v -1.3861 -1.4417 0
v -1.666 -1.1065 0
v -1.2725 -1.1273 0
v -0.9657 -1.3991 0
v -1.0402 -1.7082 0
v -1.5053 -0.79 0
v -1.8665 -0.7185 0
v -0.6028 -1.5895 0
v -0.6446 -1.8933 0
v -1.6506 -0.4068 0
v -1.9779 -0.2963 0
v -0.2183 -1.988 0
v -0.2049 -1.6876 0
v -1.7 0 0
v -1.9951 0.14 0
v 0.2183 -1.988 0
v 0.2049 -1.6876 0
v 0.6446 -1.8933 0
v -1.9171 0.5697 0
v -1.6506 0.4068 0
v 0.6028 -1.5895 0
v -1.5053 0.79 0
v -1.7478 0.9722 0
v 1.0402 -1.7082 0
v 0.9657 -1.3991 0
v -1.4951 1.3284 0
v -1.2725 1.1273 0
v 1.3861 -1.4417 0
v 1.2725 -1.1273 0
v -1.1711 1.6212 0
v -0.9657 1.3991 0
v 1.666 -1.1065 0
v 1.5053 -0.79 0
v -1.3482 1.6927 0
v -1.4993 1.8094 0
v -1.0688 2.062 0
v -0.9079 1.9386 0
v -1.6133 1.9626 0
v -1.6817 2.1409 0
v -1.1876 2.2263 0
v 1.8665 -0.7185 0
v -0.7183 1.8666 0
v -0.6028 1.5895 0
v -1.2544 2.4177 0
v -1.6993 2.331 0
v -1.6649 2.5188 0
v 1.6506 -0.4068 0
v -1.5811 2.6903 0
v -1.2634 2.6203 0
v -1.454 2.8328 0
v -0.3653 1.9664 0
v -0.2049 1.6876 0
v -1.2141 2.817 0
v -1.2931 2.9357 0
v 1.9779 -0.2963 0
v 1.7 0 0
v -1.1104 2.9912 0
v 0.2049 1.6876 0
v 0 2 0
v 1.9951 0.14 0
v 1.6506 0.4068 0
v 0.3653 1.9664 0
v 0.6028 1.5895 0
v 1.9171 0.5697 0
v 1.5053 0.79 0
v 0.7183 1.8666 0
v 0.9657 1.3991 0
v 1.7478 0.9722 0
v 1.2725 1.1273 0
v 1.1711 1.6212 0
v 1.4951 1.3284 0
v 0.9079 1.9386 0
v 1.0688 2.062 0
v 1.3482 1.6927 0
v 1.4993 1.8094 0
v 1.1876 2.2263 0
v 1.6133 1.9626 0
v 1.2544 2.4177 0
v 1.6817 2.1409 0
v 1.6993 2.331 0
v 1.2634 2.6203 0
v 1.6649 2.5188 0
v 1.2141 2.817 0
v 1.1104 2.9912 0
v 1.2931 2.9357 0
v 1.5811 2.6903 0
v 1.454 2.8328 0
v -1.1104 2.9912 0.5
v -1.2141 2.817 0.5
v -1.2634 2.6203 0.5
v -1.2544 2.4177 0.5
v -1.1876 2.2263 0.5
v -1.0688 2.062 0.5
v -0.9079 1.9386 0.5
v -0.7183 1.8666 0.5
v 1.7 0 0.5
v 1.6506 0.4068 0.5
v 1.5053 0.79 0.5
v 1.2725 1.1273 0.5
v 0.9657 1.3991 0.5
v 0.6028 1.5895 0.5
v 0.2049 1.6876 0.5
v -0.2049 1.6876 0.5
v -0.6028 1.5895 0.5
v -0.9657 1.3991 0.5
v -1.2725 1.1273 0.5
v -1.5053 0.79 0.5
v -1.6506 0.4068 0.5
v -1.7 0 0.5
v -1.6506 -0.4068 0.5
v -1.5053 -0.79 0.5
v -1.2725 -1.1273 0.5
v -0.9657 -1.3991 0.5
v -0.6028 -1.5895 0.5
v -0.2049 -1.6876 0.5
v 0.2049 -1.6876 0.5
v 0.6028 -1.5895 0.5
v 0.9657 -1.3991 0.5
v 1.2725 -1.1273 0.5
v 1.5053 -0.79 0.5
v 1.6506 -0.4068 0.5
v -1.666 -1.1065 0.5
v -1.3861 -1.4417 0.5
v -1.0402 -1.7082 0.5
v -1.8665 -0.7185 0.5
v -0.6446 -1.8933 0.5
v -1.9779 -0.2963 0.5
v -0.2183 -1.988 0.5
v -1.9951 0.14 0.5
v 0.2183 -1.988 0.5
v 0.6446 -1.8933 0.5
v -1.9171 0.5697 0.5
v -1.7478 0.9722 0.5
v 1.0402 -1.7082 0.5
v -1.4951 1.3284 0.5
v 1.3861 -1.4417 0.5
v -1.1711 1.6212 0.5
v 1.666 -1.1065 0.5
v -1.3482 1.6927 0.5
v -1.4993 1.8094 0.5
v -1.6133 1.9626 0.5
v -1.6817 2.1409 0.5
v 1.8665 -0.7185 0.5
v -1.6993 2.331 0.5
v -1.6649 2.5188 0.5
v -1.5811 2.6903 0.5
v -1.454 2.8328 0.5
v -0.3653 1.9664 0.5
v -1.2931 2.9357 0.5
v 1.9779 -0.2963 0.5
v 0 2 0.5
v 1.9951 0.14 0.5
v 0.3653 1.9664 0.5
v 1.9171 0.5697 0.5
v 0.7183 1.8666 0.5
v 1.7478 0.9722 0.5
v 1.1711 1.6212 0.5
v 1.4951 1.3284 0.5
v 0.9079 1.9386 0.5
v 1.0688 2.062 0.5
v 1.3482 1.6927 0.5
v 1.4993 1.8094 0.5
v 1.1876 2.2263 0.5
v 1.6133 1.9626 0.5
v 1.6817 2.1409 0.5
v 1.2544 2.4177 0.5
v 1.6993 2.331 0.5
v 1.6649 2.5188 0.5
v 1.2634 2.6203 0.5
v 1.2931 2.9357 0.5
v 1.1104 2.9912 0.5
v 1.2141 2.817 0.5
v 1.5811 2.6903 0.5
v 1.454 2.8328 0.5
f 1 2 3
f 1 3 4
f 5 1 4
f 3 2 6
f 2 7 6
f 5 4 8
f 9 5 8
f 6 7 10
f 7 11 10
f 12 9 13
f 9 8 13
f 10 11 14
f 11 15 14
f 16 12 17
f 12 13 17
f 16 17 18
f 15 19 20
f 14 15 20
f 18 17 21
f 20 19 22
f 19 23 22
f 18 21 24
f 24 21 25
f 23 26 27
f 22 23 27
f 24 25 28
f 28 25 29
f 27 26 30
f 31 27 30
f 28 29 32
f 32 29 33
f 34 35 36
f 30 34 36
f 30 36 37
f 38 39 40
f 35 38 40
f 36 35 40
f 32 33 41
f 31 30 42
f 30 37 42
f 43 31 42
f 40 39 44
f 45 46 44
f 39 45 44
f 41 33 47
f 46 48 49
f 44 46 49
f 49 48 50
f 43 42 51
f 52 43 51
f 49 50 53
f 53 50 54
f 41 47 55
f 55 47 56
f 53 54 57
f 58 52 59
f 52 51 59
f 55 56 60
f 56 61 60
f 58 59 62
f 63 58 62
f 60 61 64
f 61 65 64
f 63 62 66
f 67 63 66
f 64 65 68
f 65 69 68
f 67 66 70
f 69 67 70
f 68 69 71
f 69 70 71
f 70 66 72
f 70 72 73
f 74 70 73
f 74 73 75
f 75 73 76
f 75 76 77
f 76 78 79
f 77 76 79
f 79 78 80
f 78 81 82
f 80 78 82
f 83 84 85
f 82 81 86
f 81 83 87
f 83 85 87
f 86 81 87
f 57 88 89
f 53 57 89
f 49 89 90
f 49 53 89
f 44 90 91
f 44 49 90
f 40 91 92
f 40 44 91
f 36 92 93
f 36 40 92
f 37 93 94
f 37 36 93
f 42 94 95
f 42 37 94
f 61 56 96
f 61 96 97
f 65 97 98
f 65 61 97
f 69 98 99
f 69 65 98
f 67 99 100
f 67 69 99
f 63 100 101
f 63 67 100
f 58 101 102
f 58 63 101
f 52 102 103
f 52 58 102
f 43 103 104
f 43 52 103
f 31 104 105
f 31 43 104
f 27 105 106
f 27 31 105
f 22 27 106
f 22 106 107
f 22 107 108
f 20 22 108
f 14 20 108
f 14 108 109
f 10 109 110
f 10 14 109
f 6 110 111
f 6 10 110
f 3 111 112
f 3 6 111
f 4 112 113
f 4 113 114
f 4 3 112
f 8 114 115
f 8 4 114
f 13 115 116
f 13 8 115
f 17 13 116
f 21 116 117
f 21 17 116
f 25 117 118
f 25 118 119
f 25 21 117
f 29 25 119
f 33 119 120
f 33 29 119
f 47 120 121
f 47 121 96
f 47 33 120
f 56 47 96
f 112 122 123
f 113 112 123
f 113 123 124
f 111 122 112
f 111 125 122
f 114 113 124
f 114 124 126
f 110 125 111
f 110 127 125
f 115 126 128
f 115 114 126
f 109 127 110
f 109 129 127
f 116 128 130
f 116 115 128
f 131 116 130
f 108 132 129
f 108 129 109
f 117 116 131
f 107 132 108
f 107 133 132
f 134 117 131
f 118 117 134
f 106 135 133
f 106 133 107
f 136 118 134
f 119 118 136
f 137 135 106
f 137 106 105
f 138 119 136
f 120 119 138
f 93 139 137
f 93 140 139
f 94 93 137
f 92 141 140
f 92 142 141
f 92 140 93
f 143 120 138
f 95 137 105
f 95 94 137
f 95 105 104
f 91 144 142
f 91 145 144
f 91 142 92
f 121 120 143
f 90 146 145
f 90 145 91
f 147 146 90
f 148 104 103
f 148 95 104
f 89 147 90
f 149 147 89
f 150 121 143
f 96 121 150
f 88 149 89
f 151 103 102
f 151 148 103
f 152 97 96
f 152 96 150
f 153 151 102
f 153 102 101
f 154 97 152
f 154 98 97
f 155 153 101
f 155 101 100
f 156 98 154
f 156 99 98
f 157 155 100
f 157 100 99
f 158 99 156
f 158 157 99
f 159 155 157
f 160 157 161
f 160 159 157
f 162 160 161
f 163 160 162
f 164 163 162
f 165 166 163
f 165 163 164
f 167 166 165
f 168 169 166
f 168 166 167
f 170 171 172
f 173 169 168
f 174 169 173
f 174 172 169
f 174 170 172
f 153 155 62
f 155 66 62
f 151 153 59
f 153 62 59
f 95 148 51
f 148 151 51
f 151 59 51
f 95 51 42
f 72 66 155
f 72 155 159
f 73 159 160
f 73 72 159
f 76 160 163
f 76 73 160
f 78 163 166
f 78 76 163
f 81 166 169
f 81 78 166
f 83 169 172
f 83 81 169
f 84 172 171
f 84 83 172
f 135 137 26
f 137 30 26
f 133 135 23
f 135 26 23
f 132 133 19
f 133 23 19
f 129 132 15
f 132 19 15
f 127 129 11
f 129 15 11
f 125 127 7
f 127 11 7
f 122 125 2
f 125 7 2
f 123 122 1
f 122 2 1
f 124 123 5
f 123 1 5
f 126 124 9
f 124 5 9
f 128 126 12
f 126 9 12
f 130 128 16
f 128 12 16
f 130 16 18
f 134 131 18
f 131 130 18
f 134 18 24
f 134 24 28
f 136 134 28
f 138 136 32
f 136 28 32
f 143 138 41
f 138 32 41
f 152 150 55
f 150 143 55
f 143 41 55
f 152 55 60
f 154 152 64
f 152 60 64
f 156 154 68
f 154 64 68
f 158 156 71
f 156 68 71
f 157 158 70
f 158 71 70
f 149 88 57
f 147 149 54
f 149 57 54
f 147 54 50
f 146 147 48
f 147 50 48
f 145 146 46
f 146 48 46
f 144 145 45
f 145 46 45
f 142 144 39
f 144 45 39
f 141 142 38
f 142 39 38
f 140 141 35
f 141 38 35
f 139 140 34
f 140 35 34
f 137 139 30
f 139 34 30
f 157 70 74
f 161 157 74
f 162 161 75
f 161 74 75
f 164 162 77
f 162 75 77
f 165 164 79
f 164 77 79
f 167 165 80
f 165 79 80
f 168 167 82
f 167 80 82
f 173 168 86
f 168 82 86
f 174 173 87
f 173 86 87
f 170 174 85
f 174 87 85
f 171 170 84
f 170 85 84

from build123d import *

# Parameters (mm, degrees)
CYLINDER003_R          = 0.7
CYLINDER003_DEPTH      = 0.5
CYLINDER002_R          = 0.7
CYLINDER002_DEPTH      = 0.5
CUT001_PLACEMENT_ANGLE = 60
CYLINDER001_R          = 1.7
CYLINDER001_DEPTH      = 0.5
CYLINDER_R             = 2
CYLINDER_DEPTH         = 0.5
CYLINDER005_R          = 0.7
CYLINDER005_DEPTH      = 0.5
CYLINDER004_R          = 0.7
CYLINDER004_DEPTH      = 0.5
CUT002_PLACEMENT_ANGLE = 300


with BuildPart() as cilindro003:
    # Cylinder003 → Cylinder003 (new body)
    with BuildSketch(Plane(origin=(0, 0.5, 0), x_dir=(1, 0, 0), z_dir=(0, 0, 1))):
        Circle(CYLINDER003_R)
    extrude(amount=CYLINDER003_DEPTH)


with BuildPart() as cut001:
    # Cylinder002 → Cylinder002 (new body)
    with BuildSketch(Plane.XY):
        Circle(CYLINDER002_R)
    extrude(amount=CYLINDER002_DEPTH)

    # Cut001: cut Cilindro003
    add(cilindro003.part, mode=Mode.SUBTRACT)


with BuildPart() as cut001_1:
    # Cut001 placement: moved
    add(cut001.part.moved(Location((1, 2.3, 0))).rotate(Axis((1, 2.3, 0), (0, 0, 1)), CUT001_PLACEMENT_ANGLE))


with BuildPart() as cilindro001:
    # Cylinder001 → Cylinder001 (new body)
    with BuildSketch(Plane.XY):
        Circle(CYLINDER001_R)
    extrude(amount=CYLINDER001_DEPTH)


with BuildPart() as fusion:
    # Cylinder → Cylinder (new body)
    with BuildSketch(Plane.XY):
        Circle(CYLINDER_R)
    extrude(amount=CYLINDER_DEPTH)

    # Cut: cut Cilindro001
    add(cilindro001.part, mode=Mode.SUBTRACT)

    # Fusion: union Cut001
    add(cut001_1.part)


with BuildPart() as cilindro005:
    # Cylinder005 → Cylinder005 (new body)
    with BuildSketch(Plane(origin=(0, 0.5, 0), x_dir=(1, 0, 0), z_dir=(0, 0, 1))):
        Circle(CYLINDER005_R)
    extrude(amount=CYLINDER005_DEPTH)


with BuildPart() as fusion001:
    # Cylinder004 → Cylinder004 (new body)
    with BuildSketch(Plane.XY):
        Circle(CYLINDER004_R)
    extrude(amount=CYLINDER004_DEPTH)

    # Cut002: cut Cilindro005
    add(cilindro005.part, mode=Mode.SUBTRACT)


with BuildPart() as fusion001_1:
    # Cut002 placement: moved
    add(fusion001.part.moved(Location((-1, 2.3, 0))).rotate(Axis((-1, 2.3, 0), (0, 0, 1)), CUT002_PLACEMENT_ANGLE))

    # Fusion001: union Fusion
    add(fusion.part)


solid = fusion001_1.part
